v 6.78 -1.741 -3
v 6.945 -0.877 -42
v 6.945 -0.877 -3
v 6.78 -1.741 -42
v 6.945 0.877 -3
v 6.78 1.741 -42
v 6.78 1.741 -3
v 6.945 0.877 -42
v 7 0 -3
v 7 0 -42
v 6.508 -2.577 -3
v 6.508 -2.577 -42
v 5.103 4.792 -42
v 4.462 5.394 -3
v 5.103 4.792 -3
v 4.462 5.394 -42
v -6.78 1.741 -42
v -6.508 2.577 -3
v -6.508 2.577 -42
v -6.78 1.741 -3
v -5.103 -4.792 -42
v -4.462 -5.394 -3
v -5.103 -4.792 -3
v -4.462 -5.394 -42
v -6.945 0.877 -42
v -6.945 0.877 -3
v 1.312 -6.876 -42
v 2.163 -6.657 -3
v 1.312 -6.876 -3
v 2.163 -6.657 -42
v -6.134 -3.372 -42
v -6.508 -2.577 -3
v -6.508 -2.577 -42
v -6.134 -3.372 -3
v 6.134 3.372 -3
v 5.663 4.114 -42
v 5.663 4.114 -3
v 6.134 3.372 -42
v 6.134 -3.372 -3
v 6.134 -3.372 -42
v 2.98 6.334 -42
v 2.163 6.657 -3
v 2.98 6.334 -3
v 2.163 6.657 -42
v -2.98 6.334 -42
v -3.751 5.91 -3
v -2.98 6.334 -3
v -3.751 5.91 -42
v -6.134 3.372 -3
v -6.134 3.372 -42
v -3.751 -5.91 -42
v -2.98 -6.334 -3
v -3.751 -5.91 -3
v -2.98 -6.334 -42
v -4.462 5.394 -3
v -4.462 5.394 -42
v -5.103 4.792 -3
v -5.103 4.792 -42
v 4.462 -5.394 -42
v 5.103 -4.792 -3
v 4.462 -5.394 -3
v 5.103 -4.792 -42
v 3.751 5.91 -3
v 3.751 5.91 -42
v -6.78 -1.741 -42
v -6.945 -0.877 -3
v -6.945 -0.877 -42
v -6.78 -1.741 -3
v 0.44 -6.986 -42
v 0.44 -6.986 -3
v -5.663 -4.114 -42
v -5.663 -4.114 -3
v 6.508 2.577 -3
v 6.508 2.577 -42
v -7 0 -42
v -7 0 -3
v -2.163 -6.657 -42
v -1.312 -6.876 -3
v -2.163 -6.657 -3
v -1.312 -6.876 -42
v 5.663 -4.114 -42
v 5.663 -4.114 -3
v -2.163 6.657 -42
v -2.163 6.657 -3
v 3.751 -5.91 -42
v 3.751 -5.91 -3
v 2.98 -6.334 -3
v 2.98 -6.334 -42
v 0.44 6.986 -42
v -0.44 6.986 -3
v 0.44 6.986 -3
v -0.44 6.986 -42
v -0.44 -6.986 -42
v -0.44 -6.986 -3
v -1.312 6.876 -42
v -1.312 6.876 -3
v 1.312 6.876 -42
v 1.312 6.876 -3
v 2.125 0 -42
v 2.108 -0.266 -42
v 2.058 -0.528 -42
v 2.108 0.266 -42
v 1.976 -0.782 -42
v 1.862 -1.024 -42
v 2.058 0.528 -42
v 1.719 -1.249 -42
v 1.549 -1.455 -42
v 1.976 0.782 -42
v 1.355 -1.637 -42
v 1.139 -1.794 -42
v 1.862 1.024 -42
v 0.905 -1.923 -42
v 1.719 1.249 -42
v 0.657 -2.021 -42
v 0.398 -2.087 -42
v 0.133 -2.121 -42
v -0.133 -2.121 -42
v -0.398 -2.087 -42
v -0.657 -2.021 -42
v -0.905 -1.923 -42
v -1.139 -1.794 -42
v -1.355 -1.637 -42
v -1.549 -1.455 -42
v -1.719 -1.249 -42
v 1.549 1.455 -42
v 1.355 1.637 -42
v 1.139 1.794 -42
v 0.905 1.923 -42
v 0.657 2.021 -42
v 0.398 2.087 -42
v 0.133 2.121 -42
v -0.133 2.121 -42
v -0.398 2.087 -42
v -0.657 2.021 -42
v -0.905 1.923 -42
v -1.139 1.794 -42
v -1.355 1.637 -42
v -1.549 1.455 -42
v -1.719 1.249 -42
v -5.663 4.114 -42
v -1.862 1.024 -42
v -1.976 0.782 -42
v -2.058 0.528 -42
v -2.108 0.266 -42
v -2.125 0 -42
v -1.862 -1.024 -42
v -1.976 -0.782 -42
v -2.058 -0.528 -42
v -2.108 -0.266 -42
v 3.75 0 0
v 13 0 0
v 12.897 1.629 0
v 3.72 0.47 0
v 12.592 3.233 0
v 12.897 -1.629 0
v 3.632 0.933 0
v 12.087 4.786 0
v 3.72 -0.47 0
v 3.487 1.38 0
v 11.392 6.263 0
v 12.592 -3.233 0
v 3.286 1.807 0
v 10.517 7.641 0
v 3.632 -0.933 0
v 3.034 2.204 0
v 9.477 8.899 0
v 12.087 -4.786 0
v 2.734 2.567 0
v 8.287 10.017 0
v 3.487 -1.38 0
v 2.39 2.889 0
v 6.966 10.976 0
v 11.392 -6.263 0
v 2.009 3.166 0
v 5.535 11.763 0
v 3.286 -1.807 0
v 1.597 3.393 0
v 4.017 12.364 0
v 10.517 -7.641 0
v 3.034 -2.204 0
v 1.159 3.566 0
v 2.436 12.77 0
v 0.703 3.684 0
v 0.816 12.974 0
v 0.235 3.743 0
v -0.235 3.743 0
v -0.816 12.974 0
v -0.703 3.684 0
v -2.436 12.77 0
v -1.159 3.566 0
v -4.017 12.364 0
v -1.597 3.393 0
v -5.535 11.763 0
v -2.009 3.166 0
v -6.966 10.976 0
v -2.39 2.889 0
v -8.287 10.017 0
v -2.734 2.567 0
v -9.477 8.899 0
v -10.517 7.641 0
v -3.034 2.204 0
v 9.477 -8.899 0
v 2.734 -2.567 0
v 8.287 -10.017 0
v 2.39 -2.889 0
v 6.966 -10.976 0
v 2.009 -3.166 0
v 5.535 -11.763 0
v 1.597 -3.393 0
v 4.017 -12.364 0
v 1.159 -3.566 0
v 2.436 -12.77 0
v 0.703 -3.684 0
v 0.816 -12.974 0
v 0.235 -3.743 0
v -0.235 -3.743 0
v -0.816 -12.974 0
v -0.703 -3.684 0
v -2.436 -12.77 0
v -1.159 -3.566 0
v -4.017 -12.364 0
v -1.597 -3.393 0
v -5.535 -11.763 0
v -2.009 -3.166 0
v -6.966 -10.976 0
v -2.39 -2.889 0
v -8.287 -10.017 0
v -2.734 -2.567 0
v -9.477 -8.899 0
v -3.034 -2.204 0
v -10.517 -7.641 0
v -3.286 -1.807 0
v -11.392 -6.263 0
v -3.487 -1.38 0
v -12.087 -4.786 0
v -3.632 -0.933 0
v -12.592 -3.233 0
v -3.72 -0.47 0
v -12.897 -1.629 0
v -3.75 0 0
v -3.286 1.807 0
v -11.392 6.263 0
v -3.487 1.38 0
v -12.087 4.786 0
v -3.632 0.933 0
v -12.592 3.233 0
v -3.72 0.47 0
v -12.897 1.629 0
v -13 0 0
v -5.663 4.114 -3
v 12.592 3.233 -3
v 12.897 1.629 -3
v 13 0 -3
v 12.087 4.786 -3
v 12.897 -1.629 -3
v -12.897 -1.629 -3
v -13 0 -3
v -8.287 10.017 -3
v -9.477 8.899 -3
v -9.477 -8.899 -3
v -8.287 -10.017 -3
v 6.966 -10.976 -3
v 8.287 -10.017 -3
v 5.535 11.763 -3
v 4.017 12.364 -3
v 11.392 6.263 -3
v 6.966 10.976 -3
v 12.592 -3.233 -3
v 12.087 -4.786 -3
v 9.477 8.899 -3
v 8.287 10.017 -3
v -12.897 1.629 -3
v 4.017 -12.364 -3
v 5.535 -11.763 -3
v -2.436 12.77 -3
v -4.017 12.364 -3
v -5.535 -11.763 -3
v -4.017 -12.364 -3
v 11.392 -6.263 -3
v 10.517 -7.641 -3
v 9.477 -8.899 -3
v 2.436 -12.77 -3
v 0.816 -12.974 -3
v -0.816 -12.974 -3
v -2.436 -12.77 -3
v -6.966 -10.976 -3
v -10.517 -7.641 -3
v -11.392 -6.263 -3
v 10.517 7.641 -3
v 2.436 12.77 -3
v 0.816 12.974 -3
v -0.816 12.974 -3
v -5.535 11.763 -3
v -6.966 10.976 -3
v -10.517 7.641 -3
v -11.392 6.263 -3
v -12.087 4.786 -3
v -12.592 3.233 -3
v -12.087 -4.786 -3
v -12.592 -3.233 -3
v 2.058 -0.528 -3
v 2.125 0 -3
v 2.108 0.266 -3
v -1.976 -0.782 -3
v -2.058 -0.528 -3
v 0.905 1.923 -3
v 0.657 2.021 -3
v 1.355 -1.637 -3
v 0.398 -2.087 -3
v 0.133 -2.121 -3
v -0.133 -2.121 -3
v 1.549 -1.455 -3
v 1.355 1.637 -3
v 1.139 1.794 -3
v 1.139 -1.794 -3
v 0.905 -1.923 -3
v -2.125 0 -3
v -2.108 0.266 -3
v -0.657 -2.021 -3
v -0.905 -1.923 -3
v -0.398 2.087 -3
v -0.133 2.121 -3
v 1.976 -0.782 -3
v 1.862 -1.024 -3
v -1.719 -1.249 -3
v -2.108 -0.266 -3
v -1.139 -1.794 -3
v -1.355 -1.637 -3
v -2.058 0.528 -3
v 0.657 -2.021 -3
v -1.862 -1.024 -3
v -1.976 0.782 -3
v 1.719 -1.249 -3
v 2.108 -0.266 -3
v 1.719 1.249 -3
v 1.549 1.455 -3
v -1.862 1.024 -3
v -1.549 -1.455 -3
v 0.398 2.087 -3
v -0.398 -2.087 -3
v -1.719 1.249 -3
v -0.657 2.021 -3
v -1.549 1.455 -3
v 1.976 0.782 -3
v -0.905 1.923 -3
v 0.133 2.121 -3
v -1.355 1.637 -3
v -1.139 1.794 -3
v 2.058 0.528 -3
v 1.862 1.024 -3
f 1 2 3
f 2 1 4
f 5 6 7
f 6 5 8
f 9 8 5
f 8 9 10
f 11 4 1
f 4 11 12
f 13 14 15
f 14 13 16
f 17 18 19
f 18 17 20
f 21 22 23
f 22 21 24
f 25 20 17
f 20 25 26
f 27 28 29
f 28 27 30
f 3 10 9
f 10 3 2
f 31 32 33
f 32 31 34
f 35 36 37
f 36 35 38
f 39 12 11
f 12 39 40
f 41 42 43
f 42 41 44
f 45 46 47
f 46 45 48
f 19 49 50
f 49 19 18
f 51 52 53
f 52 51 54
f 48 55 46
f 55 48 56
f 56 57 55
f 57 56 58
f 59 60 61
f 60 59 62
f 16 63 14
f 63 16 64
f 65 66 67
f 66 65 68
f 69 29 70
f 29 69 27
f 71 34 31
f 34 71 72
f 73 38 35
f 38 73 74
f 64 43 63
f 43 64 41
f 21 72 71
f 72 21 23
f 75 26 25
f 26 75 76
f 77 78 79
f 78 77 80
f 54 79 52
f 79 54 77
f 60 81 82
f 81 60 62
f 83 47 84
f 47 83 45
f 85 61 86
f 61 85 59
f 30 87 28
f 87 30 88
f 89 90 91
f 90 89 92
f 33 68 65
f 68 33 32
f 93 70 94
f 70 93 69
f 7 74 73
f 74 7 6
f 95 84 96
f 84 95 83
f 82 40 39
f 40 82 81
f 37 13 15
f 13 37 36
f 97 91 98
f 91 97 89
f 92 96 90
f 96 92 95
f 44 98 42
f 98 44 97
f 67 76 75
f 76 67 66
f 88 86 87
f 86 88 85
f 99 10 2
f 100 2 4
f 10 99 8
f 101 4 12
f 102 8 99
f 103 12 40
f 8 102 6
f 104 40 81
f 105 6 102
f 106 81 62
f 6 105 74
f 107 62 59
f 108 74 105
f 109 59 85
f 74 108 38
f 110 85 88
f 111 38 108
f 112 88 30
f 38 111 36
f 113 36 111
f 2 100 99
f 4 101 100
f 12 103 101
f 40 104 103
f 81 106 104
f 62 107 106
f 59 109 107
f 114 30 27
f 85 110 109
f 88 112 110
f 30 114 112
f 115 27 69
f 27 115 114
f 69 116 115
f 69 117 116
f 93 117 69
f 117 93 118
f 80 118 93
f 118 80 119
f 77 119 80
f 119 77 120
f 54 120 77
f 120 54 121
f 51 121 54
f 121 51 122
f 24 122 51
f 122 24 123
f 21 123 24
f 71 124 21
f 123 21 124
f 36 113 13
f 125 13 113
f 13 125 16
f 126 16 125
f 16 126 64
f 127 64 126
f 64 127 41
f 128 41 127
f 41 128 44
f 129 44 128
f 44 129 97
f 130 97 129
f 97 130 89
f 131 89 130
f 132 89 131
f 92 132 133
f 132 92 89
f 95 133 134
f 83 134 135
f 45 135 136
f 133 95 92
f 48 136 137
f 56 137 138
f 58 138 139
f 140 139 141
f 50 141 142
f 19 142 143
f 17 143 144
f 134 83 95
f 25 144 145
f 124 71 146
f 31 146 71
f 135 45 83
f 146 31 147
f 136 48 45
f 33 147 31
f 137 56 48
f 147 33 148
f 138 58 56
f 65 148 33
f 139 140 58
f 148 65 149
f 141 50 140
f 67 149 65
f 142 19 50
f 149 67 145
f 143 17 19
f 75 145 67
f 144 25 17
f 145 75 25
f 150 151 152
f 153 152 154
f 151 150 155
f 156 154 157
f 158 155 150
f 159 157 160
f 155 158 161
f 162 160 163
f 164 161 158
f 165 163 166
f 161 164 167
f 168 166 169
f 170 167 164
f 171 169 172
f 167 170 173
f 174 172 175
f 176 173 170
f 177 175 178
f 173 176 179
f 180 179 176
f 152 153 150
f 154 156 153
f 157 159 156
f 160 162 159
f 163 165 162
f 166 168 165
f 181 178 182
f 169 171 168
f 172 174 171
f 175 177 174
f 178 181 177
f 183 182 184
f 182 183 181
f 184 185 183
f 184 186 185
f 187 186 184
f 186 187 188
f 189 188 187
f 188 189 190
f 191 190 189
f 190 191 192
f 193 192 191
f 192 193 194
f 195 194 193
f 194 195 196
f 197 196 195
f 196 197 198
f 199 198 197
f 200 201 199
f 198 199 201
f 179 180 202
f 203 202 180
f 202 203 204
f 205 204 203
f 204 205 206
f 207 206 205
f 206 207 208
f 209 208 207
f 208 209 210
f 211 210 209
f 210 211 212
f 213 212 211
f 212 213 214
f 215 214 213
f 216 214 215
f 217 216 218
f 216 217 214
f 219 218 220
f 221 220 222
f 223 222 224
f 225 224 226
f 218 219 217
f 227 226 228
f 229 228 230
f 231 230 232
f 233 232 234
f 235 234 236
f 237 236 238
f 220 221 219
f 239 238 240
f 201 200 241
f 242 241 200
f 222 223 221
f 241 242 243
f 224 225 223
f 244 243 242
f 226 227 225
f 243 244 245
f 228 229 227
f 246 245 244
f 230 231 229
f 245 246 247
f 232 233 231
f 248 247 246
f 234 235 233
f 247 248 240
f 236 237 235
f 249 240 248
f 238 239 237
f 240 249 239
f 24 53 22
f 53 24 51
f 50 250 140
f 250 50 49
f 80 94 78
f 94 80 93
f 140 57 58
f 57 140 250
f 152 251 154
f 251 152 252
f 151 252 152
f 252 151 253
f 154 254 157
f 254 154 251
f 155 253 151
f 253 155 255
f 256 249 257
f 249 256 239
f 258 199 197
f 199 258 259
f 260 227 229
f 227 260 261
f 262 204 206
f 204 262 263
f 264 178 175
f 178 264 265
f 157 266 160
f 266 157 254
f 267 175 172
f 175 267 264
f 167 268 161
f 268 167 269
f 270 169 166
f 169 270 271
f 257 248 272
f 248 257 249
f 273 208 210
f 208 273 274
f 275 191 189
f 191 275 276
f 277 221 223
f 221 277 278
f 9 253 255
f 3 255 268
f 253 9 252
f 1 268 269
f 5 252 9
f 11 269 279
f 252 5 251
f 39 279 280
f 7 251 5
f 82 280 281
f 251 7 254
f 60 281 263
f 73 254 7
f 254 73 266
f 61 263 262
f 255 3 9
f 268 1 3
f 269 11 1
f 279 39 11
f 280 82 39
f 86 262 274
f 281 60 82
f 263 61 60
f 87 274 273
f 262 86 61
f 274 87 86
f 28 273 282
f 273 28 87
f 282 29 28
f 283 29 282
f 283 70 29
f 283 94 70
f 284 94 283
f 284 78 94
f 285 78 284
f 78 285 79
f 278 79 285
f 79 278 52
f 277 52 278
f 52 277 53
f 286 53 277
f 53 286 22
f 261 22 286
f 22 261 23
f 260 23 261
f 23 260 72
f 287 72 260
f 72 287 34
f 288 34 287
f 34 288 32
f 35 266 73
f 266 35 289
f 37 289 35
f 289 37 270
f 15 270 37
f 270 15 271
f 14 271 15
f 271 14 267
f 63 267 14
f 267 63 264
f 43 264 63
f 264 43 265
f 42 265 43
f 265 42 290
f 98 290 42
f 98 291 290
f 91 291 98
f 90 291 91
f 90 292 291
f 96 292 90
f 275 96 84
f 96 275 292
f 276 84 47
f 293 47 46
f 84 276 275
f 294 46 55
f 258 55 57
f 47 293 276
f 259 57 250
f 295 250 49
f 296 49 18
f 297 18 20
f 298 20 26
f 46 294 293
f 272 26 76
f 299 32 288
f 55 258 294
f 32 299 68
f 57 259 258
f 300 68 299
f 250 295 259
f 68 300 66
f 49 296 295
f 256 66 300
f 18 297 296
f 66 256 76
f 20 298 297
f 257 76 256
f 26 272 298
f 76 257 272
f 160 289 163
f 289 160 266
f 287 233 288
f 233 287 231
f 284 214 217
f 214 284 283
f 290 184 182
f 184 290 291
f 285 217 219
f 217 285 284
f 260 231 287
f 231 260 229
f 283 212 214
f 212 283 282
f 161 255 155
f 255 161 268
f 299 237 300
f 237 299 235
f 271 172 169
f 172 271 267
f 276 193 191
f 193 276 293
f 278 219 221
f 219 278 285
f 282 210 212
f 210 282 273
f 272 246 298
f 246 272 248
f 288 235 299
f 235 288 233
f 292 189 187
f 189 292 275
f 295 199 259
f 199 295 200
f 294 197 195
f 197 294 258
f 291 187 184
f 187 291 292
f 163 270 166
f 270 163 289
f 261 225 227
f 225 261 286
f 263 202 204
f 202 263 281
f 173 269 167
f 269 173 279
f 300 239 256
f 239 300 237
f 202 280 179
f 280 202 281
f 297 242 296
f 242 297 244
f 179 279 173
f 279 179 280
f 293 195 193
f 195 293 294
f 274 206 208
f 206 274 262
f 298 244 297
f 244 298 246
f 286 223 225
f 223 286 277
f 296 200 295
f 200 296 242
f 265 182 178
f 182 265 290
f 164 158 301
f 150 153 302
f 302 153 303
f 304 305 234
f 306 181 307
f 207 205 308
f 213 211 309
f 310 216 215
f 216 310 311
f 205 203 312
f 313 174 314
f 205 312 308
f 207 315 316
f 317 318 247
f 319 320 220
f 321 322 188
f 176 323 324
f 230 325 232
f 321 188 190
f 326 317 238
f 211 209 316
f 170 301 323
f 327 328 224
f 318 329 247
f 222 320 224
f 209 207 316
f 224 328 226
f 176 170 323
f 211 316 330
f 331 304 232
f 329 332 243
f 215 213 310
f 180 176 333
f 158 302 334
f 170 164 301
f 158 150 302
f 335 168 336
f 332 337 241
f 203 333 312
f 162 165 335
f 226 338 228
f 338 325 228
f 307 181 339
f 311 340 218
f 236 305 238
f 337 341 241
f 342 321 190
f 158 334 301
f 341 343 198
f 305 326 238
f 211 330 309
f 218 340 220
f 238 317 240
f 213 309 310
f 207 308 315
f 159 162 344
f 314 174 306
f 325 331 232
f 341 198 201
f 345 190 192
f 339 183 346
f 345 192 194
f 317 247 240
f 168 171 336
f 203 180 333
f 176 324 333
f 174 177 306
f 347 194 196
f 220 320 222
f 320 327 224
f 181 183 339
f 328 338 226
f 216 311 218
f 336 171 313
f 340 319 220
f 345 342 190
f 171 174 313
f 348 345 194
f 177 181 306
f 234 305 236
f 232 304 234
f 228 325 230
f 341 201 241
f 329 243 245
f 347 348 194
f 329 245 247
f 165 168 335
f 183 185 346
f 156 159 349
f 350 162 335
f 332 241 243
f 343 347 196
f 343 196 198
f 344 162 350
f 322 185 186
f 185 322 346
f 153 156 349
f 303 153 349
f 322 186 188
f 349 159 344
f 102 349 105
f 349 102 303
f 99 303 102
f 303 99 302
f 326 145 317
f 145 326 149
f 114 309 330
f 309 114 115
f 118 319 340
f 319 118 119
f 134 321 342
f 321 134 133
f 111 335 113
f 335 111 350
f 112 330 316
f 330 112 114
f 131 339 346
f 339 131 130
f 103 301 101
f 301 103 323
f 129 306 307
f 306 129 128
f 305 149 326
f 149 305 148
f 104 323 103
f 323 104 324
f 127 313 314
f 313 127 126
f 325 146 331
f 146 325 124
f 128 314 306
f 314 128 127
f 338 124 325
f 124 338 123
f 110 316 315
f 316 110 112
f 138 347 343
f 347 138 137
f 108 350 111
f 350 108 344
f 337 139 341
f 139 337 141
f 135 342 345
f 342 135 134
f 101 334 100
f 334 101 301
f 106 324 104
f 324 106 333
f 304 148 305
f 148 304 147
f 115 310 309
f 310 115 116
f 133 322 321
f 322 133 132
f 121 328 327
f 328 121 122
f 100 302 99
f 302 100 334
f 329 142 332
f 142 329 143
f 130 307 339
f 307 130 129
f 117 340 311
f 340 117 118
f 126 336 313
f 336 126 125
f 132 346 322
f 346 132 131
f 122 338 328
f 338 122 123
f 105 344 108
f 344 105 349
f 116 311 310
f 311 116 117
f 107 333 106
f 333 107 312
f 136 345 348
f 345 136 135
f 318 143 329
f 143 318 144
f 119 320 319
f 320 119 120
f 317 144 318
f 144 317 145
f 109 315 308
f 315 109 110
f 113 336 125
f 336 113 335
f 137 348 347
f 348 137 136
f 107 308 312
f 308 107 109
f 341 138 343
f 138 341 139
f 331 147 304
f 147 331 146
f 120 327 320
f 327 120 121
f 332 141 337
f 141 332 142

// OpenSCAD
$fn = 50;


difference() {
	union() {
		translate(v = [0, 0, -42.0000000000]) {
			cylinder(h = 42, r = 7.0000000000);
		}
		translate(v = [0, 0, -3.0000000000]) {
			cylinder(h = 3, r = 13.0000000000);
		}
	}
	union() {
		translate(v = [0, 0, 0]) {
			rotate(a = [0, 0, 0]) {
				difference() {
					union() {
						#translate(v = [0, 0, -42.0000000000]) {
							cylinder(h = 42, r = 2.0000000000);
						}
						#translate(v = [0, 0, -3]) {
							cylinder(h = 3, r1 = 2.1250000000, r2 = 3.7500000000);
						}
						#translate(v = [0, 0, -42.0000000000]) {
							cylinder(h = 42, r = 2.1250000000);
						}
						#translate(v = [0, 0, -42.0000000000]) {
							cylinder(h = 42, r = 2.0000000000);
						}
					}
					union();
				}
			}
		}
	}
}
